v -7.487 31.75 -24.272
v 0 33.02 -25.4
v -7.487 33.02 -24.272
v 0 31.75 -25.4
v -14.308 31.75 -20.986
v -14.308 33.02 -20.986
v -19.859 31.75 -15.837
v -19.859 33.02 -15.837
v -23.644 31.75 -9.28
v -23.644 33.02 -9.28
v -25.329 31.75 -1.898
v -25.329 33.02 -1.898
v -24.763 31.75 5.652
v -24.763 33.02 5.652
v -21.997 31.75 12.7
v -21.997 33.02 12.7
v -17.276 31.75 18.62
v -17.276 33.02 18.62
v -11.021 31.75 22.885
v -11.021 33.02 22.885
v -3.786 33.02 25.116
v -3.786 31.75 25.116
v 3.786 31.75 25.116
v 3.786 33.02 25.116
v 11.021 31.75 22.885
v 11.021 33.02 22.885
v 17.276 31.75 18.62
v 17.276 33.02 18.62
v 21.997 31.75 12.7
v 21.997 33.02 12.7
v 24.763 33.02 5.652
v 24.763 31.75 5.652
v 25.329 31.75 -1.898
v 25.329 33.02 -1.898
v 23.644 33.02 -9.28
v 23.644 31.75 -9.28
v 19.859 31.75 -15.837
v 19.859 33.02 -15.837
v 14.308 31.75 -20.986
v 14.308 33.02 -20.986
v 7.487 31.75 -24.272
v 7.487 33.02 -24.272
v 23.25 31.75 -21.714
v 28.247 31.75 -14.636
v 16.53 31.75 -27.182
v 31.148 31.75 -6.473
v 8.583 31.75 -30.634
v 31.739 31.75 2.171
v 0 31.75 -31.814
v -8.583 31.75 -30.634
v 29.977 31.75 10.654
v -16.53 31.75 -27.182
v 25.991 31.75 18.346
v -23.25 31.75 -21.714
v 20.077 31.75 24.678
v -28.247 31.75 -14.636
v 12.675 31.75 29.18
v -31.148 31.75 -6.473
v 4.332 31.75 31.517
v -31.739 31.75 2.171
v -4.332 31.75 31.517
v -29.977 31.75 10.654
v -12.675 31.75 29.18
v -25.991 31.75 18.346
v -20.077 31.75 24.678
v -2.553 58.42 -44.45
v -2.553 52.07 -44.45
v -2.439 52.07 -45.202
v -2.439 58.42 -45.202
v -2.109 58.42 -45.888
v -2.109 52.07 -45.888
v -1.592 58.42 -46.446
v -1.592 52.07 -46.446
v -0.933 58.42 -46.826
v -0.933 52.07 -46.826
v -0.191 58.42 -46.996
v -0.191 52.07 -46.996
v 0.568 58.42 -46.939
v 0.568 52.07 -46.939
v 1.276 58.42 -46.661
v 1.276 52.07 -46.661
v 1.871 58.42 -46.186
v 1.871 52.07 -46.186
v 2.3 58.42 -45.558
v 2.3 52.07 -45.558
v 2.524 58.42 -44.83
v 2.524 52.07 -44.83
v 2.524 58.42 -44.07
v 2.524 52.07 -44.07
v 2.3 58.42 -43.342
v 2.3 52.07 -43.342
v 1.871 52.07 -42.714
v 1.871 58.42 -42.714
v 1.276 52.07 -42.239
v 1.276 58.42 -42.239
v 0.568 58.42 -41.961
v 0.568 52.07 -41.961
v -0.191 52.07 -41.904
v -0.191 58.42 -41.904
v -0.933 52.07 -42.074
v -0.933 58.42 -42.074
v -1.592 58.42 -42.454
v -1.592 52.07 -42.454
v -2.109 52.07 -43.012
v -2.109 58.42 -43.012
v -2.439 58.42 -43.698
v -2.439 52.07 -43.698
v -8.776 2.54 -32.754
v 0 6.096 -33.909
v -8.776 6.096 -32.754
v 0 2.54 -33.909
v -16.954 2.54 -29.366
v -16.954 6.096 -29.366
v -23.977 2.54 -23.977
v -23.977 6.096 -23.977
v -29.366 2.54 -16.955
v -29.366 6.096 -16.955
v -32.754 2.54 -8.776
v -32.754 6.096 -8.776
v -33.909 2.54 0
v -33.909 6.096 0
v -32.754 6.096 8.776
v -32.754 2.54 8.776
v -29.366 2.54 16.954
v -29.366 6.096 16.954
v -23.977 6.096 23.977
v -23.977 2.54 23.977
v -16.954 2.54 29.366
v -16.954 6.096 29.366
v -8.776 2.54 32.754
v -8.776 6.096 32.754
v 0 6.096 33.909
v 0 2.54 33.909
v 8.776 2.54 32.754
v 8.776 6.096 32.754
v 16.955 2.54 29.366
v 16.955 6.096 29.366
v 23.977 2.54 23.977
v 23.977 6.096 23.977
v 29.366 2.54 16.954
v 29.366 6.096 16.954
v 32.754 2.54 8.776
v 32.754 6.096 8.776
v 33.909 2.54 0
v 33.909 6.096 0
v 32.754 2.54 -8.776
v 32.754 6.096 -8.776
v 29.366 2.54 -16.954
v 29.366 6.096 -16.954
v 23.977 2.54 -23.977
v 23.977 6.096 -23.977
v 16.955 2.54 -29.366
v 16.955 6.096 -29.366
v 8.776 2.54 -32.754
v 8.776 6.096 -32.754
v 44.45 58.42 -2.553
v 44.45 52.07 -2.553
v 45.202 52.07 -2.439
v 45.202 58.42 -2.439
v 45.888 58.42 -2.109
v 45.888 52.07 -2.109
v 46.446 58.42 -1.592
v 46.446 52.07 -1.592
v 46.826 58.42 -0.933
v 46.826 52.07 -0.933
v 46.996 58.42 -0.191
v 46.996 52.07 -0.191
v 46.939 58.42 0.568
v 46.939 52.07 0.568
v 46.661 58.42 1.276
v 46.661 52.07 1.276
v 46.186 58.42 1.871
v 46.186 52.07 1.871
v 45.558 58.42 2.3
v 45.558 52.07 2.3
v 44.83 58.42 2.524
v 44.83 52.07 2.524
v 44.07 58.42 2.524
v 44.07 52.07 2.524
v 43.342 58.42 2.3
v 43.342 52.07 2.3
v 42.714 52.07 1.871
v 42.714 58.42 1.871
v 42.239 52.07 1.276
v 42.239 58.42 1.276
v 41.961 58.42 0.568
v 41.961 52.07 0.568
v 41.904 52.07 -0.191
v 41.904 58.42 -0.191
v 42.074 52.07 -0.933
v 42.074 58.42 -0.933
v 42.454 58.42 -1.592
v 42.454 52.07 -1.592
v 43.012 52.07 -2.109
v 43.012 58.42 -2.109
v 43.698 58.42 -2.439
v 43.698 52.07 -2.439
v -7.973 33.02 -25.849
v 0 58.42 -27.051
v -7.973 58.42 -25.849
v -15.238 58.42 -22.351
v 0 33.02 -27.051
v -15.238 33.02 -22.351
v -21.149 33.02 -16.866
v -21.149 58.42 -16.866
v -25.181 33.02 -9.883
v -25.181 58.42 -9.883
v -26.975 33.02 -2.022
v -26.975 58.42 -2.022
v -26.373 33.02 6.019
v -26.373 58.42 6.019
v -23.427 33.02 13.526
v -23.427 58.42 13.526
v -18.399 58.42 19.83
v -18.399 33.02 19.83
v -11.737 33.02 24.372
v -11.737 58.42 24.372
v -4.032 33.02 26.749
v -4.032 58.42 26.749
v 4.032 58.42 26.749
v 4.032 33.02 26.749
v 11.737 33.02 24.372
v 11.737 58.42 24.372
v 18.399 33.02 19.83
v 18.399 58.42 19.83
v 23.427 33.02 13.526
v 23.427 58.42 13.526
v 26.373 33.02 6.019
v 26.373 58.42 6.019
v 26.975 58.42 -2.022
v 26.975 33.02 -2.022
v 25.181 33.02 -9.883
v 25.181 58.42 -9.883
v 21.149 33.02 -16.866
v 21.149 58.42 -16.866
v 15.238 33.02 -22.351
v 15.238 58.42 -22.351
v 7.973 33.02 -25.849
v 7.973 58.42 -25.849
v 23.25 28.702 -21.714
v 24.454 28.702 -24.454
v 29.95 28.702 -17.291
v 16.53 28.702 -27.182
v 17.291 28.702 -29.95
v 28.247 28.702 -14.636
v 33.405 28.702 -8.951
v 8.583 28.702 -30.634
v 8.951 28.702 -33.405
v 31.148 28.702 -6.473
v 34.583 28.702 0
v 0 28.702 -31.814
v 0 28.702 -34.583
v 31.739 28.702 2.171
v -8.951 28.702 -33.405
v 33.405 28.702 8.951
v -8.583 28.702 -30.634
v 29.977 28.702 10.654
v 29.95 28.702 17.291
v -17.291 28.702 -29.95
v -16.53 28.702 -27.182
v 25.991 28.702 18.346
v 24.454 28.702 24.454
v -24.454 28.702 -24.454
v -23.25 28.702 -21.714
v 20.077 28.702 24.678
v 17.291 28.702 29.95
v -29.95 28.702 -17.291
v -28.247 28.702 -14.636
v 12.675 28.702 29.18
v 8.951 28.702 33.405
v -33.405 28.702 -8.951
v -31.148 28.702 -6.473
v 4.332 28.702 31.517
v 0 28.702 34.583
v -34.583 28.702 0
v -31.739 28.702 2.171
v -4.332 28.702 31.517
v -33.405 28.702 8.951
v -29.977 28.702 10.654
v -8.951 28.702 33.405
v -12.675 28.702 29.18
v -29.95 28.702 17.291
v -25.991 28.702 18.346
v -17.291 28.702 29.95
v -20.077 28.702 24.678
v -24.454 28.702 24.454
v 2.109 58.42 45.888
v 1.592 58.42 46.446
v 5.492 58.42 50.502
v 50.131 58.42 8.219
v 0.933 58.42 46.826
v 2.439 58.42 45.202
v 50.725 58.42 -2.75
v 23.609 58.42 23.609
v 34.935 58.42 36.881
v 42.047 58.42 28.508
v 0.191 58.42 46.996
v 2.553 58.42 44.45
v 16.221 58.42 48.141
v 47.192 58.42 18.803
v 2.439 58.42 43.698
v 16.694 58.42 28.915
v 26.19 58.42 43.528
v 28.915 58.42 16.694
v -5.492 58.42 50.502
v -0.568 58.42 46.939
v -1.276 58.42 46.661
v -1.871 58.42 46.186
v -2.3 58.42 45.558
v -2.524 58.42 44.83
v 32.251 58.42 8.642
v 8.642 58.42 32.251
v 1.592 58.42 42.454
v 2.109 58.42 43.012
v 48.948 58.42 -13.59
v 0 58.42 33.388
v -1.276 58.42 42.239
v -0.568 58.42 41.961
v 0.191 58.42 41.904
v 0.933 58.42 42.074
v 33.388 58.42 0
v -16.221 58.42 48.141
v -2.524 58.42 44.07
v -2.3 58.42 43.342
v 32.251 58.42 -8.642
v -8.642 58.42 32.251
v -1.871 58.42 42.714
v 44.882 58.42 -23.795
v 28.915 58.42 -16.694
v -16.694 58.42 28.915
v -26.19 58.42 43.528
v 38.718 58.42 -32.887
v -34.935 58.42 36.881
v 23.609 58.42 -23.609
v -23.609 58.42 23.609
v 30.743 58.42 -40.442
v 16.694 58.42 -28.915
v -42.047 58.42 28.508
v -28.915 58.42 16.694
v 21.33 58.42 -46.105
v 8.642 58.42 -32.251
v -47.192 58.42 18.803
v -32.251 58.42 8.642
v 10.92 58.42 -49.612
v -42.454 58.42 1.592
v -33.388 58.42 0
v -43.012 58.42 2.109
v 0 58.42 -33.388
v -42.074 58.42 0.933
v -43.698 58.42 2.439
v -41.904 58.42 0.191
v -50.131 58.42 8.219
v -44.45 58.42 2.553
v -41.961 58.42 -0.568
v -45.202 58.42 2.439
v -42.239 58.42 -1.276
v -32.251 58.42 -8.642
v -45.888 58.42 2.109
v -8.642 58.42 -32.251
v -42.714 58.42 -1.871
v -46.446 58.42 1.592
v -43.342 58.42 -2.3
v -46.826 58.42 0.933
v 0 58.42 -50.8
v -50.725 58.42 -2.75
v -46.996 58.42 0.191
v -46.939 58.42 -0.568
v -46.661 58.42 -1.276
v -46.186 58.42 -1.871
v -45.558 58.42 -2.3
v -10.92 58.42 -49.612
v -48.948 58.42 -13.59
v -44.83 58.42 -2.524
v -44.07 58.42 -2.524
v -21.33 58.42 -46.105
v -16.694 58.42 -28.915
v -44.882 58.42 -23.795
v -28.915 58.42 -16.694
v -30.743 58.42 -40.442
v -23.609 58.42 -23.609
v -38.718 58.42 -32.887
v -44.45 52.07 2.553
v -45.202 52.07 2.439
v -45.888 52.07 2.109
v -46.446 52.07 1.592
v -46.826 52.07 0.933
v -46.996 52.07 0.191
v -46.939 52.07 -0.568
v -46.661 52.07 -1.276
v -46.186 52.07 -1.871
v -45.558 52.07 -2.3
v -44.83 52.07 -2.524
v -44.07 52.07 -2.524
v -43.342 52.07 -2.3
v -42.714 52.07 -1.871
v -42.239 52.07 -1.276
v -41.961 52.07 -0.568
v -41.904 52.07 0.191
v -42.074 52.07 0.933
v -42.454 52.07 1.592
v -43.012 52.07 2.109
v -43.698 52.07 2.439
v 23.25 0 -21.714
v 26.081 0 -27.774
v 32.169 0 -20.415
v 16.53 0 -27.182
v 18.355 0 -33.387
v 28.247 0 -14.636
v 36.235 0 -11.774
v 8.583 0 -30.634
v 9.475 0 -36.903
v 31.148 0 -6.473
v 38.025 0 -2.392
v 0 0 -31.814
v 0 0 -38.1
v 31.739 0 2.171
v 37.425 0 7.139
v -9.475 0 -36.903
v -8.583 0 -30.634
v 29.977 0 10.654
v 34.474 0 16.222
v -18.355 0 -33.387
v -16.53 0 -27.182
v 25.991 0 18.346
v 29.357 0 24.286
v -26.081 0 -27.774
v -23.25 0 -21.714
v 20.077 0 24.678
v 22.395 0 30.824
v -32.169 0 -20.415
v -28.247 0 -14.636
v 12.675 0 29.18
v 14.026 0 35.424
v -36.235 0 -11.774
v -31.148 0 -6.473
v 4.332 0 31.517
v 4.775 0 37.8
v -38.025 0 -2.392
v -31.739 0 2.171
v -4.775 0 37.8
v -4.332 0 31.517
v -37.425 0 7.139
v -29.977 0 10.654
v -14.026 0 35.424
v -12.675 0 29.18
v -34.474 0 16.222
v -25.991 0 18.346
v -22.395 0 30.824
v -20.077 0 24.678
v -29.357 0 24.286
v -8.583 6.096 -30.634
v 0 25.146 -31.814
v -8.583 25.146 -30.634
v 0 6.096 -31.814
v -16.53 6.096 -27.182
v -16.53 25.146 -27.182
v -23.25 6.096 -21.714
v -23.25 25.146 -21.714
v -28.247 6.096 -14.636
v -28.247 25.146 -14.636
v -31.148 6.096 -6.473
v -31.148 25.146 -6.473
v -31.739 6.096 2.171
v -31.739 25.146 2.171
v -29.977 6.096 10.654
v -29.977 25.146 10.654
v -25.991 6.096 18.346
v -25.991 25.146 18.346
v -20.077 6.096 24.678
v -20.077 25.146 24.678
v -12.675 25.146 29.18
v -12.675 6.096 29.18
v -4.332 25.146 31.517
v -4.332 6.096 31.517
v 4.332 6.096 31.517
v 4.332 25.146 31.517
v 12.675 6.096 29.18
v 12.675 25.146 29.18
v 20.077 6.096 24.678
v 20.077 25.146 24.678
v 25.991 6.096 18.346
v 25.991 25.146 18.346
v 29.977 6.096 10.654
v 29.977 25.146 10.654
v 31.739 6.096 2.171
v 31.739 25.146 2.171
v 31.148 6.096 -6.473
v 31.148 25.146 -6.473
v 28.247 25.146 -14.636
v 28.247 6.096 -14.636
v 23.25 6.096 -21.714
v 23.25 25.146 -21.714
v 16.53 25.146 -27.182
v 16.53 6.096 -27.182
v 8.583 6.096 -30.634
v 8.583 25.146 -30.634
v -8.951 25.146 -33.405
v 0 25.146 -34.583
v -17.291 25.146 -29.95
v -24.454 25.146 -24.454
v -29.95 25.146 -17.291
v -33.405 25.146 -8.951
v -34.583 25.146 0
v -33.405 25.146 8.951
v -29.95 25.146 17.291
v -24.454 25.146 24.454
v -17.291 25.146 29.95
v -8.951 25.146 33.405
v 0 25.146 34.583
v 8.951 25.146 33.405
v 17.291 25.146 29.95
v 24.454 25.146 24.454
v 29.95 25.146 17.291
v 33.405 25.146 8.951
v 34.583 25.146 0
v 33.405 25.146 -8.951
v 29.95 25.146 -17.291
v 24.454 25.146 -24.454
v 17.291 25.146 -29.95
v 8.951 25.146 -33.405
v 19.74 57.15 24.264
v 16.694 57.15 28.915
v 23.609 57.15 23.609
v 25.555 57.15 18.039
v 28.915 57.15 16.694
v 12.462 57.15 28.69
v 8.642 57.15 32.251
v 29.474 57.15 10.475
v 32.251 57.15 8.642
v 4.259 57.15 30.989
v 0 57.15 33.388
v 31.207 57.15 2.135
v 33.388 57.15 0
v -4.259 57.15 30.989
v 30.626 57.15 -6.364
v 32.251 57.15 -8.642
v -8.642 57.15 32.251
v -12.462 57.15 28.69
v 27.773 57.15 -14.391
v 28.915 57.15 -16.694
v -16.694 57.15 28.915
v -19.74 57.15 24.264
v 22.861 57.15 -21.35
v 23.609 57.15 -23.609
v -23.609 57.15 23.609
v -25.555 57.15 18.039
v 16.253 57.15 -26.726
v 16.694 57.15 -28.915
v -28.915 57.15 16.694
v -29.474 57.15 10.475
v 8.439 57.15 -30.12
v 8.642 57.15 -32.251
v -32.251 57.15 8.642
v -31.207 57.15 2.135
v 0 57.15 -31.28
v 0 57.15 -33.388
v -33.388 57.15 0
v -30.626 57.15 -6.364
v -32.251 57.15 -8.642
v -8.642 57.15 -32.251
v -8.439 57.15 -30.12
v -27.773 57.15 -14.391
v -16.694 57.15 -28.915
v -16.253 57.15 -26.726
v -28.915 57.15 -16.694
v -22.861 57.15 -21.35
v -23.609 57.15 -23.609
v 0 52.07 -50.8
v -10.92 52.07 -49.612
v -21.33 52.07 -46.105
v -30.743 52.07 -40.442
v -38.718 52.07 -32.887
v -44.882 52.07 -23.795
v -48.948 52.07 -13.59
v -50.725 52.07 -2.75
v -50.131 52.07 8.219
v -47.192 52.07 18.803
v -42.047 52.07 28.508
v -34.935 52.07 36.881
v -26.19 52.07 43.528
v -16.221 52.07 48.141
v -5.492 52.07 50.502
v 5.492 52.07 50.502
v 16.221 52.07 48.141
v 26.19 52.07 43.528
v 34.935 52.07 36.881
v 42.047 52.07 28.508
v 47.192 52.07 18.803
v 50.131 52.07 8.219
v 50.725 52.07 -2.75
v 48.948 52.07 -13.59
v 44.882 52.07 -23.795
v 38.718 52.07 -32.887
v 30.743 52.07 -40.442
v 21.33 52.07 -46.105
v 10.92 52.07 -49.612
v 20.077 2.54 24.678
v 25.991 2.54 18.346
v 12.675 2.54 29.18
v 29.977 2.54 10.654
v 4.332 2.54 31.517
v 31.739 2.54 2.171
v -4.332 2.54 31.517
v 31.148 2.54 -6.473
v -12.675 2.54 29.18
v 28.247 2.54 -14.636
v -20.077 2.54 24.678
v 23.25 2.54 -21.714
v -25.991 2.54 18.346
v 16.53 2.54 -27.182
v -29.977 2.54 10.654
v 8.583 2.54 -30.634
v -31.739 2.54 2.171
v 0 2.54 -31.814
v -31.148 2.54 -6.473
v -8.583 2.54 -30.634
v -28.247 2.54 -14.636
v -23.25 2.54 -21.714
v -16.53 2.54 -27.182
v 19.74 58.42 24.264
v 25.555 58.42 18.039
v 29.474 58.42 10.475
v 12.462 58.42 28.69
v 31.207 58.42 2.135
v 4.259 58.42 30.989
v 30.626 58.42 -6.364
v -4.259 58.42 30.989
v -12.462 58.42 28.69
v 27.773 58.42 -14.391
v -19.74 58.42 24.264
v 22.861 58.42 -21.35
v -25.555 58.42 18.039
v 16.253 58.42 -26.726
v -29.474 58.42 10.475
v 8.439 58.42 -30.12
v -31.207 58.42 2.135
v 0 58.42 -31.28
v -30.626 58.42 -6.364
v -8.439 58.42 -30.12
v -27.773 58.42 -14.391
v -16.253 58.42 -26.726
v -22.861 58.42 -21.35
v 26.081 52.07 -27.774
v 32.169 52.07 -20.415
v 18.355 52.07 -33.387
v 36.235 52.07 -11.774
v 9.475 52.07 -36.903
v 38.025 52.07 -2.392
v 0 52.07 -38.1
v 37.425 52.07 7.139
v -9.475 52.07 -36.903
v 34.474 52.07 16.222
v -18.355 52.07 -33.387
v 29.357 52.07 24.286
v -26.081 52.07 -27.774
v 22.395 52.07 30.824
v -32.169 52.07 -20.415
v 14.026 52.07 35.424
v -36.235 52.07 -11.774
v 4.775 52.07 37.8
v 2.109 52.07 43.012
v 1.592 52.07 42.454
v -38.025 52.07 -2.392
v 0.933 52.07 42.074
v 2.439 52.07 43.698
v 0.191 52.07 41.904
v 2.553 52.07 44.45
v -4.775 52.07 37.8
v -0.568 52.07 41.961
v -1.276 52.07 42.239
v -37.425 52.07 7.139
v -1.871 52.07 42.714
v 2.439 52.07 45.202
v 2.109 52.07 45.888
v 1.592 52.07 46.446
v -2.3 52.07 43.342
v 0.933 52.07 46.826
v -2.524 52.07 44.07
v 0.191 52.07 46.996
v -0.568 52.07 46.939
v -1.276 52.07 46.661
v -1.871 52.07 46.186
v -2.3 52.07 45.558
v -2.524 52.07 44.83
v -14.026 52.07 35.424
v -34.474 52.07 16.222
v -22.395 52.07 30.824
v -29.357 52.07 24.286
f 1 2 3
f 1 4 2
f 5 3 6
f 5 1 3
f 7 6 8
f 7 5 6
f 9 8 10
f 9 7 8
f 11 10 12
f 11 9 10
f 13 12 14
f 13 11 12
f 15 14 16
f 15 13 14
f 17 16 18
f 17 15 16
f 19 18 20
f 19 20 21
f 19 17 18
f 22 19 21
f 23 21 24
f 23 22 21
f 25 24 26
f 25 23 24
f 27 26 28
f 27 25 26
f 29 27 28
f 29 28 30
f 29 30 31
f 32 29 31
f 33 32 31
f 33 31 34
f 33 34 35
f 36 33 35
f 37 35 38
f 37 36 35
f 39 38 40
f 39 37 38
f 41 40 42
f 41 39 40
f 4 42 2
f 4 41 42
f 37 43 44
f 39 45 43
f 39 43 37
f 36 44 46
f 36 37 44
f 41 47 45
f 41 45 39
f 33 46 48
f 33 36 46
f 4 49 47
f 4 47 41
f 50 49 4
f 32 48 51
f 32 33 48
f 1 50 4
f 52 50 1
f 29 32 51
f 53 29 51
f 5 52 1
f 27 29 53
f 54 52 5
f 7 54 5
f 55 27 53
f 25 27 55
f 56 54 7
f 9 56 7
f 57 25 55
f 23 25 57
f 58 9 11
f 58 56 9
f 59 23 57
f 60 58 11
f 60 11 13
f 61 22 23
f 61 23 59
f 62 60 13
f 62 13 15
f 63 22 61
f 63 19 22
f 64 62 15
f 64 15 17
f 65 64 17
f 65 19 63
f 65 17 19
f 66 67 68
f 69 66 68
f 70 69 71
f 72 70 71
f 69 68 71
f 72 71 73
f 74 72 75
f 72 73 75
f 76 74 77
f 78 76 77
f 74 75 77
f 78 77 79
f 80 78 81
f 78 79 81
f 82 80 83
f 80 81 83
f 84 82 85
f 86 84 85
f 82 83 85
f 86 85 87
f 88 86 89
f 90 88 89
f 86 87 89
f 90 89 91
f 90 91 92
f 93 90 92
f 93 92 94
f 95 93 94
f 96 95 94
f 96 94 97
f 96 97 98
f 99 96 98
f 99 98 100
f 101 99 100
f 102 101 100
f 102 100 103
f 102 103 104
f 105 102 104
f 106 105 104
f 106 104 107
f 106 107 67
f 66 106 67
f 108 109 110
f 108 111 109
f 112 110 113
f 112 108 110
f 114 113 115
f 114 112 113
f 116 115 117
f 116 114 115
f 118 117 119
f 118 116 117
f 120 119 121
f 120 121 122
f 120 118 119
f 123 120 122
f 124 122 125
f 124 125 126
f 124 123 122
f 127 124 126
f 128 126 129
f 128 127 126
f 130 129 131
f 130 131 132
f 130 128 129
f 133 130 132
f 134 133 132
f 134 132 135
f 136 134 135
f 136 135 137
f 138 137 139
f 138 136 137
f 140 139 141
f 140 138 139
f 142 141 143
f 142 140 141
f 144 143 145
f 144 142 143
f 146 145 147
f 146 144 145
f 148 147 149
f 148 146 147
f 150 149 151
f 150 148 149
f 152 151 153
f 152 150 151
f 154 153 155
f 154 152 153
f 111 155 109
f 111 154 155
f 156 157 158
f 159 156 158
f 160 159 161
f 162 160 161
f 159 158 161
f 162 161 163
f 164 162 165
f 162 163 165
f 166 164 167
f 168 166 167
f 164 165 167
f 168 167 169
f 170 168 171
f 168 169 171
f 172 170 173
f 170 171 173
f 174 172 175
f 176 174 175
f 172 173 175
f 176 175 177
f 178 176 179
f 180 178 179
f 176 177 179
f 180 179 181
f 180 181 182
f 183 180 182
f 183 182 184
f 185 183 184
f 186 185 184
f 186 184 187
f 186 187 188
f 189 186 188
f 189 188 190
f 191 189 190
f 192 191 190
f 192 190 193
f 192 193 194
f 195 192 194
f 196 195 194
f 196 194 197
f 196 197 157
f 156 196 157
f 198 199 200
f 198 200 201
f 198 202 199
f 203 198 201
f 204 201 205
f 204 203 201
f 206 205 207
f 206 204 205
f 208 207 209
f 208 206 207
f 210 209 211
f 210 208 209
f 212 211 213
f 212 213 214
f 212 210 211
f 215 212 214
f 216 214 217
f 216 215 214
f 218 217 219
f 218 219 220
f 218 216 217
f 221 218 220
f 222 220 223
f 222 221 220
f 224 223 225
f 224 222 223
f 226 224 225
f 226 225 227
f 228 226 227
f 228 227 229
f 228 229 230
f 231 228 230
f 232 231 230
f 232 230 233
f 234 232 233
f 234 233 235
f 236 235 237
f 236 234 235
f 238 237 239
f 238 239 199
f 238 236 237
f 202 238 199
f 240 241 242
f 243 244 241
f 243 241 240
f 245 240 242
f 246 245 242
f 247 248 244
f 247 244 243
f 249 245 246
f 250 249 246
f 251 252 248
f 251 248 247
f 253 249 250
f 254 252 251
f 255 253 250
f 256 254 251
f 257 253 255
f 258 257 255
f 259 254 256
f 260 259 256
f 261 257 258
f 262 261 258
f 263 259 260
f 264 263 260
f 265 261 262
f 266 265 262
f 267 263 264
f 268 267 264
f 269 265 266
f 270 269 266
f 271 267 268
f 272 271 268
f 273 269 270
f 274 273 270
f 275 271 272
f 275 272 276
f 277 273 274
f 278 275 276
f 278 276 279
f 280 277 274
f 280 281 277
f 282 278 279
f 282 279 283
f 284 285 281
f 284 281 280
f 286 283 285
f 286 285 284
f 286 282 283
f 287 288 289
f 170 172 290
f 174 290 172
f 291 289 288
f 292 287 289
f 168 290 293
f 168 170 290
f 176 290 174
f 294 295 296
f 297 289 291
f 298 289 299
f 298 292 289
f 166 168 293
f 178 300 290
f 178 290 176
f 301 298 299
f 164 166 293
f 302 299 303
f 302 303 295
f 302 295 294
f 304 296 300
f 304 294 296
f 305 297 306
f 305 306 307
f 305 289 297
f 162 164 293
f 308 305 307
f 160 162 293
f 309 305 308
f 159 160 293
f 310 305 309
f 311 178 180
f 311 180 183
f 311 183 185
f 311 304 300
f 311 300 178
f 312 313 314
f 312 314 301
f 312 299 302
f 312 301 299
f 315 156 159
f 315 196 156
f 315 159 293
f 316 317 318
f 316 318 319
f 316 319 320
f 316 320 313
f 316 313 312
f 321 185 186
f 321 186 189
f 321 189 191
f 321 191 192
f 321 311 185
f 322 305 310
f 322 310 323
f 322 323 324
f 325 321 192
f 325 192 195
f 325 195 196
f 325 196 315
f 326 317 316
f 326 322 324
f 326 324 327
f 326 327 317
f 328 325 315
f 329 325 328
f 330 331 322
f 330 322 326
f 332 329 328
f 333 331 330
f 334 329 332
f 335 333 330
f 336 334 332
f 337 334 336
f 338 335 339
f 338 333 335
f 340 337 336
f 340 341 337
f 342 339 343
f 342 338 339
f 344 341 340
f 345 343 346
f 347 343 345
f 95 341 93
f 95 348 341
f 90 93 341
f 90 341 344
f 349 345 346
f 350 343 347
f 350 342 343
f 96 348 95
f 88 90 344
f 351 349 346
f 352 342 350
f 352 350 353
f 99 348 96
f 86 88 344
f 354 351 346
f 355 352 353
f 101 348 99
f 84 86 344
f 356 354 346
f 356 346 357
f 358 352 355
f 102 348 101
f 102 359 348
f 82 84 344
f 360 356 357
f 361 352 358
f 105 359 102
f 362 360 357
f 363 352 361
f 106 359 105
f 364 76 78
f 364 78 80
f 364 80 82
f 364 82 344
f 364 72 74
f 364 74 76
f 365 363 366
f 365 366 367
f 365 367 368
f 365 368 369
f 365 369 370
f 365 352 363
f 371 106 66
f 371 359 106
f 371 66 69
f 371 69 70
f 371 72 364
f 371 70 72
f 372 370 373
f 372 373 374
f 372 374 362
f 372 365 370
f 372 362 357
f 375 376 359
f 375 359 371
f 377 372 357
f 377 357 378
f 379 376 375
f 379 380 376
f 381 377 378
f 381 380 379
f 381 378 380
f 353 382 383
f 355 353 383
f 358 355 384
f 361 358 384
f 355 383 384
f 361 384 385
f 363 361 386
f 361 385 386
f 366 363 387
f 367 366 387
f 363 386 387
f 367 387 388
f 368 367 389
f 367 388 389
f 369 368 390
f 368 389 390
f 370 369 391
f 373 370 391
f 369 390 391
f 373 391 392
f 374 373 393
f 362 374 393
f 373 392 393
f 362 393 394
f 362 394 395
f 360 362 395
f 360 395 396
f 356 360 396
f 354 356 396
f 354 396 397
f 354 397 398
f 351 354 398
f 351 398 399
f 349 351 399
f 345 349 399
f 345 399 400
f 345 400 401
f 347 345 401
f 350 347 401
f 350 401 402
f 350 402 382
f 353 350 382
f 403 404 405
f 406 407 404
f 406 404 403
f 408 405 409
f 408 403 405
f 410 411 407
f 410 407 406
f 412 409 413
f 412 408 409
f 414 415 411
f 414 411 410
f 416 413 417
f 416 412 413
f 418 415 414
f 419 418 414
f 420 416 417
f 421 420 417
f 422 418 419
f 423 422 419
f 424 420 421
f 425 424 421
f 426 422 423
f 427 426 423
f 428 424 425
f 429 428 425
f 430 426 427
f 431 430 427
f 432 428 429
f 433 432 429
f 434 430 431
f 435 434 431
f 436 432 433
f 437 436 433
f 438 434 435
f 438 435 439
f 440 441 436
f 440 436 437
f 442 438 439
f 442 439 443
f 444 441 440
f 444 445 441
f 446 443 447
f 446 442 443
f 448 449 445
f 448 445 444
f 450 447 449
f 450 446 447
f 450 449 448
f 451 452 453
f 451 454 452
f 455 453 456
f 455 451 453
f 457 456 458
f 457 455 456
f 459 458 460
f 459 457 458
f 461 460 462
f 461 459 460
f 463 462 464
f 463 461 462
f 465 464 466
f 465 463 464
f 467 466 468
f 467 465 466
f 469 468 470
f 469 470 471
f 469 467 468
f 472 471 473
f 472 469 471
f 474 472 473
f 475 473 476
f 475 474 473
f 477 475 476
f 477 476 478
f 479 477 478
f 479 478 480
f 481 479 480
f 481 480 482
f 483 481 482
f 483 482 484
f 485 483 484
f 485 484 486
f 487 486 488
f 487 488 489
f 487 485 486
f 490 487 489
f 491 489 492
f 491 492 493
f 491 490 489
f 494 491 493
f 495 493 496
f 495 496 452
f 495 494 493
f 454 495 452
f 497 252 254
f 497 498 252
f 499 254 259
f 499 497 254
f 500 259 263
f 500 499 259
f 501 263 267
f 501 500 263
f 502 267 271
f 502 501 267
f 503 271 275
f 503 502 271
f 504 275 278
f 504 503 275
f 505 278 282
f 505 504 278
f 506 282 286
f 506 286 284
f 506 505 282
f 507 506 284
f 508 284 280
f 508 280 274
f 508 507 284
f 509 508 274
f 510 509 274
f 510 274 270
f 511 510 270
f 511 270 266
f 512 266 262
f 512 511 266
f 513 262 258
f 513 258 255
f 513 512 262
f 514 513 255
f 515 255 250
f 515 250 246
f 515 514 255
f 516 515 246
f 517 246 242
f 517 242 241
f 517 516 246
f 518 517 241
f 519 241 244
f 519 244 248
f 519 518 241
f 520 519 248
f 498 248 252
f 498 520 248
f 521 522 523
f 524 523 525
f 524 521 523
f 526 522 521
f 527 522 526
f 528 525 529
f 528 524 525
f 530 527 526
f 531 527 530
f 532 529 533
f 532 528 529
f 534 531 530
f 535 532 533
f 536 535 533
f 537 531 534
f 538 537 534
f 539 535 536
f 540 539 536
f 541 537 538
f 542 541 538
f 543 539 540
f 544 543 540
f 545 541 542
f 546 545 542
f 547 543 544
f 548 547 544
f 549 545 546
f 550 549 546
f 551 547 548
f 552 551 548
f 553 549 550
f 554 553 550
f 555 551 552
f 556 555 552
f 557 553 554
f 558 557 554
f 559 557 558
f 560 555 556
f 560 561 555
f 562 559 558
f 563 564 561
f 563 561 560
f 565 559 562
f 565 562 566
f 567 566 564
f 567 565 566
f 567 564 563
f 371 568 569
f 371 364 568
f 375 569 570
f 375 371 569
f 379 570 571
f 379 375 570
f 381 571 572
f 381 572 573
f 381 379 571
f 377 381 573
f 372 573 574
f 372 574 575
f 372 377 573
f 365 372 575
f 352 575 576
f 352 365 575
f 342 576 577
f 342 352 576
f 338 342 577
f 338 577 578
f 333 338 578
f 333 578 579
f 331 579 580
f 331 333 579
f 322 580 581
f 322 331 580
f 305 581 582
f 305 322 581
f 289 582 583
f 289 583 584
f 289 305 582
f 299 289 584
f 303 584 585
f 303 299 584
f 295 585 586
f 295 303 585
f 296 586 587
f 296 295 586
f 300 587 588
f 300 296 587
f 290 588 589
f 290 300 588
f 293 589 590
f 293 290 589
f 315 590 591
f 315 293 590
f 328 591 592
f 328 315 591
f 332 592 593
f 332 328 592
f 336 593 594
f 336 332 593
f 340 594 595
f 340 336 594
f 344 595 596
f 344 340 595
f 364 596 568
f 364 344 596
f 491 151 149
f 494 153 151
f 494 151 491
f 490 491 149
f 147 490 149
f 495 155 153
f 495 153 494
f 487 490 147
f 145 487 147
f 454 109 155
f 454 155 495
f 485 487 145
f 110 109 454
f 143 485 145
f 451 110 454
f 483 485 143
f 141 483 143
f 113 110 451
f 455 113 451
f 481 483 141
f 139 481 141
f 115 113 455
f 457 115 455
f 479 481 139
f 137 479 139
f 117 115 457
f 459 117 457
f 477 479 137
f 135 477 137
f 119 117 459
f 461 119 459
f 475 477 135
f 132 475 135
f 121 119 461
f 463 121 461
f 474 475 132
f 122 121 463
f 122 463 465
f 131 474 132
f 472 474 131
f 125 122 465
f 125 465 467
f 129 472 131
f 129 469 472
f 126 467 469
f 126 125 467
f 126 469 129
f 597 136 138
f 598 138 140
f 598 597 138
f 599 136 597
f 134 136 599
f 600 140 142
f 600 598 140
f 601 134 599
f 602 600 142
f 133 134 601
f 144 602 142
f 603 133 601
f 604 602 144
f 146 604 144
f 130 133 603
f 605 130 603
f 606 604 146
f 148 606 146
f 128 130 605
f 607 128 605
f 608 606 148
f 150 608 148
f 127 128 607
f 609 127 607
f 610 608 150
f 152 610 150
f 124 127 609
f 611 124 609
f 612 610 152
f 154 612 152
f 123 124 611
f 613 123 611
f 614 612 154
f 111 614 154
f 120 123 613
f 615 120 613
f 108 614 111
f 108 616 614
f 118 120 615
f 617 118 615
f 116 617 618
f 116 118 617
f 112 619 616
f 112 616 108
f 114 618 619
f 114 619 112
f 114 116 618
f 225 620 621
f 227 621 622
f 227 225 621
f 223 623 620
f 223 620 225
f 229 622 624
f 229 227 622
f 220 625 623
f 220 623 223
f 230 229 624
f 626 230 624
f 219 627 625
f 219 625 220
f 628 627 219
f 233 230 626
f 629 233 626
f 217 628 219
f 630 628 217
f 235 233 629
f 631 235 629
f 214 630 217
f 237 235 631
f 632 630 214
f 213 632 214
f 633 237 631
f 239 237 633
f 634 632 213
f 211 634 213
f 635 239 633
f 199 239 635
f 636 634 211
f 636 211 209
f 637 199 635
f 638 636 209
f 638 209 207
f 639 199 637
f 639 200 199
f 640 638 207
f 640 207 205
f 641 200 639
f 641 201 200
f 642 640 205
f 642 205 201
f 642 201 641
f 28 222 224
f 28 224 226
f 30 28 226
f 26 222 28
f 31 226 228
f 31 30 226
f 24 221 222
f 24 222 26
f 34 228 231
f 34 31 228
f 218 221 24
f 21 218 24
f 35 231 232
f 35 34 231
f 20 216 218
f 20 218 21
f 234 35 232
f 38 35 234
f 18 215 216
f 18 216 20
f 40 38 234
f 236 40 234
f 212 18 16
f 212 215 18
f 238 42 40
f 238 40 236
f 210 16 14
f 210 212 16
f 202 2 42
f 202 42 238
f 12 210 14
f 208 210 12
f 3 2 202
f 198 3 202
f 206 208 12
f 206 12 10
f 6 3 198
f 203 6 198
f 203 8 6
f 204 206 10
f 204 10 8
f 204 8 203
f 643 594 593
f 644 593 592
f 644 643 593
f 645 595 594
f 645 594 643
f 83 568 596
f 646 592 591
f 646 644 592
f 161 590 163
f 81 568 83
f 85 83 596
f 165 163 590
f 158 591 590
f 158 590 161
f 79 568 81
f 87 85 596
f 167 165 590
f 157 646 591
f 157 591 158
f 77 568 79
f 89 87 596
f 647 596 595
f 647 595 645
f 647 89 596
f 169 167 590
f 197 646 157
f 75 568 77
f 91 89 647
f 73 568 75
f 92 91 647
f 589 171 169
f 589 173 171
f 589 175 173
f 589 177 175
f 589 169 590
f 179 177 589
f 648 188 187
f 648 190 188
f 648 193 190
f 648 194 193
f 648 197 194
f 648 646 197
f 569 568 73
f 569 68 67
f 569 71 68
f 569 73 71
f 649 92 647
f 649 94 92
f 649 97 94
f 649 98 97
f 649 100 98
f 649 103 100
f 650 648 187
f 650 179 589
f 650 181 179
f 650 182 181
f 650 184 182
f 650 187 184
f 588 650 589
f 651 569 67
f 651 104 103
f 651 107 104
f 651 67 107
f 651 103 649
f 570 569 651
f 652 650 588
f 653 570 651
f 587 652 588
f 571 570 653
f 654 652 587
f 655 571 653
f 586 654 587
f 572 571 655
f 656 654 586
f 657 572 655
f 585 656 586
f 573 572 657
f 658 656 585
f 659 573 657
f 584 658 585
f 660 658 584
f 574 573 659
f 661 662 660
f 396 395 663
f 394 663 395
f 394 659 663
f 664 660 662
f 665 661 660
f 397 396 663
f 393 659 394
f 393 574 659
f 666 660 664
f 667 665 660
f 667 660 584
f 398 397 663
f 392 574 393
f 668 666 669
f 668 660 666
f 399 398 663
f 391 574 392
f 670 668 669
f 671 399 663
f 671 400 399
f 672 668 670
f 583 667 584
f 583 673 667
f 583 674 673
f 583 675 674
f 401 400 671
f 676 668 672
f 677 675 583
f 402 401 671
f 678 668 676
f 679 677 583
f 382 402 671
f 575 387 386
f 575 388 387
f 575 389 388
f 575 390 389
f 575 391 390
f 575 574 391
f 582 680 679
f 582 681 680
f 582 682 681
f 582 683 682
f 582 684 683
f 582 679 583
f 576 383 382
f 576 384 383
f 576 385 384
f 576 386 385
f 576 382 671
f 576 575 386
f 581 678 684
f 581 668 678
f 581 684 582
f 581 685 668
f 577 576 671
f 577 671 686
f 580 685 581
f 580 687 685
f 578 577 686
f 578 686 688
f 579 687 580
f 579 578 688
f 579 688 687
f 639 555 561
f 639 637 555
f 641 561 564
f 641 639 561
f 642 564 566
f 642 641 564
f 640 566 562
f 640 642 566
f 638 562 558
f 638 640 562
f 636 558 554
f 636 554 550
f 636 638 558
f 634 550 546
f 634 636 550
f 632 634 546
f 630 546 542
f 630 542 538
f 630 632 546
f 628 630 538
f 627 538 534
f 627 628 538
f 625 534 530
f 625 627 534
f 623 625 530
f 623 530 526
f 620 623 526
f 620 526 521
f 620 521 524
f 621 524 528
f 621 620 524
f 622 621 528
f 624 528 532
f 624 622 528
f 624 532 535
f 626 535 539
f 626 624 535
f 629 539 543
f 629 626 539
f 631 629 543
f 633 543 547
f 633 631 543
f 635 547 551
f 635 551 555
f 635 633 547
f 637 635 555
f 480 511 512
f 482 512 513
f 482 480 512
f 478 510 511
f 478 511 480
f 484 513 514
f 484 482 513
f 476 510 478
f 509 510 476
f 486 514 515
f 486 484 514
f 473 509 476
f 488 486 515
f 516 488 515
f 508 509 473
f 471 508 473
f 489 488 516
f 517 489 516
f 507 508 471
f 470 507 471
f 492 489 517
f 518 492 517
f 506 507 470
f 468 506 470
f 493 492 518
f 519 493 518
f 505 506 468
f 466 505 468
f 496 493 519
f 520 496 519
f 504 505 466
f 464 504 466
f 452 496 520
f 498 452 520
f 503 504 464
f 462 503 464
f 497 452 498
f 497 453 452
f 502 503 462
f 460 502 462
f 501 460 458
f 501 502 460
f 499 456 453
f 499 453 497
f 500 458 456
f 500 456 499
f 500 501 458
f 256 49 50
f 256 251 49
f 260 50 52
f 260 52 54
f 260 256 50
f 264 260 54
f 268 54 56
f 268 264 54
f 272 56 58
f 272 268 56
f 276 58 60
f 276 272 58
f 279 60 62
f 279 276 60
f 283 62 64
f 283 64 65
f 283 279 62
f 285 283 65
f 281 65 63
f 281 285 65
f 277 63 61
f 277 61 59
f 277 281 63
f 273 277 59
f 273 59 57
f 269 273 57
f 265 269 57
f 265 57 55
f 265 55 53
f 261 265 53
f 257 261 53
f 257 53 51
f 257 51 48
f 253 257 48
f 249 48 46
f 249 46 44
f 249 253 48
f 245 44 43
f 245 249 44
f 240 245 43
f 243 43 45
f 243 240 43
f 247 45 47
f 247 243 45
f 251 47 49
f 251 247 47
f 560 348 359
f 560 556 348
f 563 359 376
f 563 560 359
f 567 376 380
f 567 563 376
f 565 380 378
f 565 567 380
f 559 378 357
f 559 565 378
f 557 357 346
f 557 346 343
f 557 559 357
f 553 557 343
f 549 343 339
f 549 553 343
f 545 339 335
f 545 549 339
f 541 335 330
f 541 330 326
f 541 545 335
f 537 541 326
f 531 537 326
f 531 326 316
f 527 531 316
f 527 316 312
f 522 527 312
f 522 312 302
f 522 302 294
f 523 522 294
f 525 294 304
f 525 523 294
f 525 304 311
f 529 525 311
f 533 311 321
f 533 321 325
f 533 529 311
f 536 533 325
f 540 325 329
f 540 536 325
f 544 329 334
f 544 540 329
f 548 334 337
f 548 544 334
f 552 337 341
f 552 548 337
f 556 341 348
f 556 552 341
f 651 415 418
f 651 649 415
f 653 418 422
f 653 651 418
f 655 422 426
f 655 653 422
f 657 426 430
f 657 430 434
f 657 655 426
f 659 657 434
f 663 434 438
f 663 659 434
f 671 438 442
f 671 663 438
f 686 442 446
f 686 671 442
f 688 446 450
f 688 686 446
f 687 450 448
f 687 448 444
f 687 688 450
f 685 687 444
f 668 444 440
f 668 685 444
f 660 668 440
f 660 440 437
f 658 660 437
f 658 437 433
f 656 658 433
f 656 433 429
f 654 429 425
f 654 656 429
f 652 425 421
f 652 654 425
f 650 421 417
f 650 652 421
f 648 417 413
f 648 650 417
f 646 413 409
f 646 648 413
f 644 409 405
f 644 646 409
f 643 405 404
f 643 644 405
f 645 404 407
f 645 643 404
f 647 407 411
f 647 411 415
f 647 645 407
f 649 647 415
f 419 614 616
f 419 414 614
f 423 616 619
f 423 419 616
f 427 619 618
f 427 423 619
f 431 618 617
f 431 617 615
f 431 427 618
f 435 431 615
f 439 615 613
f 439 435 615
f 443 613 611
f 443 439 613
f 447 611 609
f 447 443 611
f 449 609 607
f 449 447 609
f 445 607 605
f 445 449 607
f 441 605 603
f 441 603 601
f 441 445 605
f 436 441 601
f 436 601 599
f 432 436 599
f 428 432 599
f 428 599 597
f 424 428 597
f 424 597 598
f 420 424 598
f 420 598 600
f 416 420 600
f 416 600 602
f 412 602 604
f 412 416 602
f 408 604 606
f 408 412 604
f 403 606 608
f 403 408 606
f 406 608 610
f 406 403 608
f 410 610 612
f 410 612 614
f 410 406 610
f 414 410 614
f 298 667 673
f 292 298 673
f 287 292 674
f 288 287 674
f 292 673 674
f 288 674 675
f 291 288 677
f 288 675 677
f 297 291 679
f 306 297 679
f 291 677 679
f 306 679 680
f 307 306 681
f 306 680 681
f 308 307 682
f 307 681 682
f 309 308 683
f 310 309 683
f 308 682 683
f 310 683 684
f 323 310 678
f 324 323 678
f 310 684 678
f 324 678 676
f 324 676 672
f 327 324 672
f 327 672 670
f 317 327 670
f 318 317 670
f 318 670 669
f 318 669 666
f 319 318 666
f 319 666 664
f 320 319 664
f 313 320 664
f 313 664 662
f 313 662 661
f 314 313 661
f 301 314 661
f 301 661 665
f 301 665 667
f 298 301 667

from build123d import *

# Parameters (mm, degrees)
TAPPED_HOLE_FOR_10_32_HELICOIL1_D = 5.1054
CIRPATTERN1_COUNT                 = 4


with BuildPart() as part:
    # Sketch1 → Revolve1 (revolve)
    with BuildSketch(Plane.XY, mode=Mode.PRIVATE) as revolve1_sk:
        Polygon((31.8135, 0), (38.1, 0), (38.1, 52.07), (50.8, 52.07), (50.8, 58.42), (33.3883, 58.42), (33.3883, 57.15), (31.2801, 57.15), (31.2801, 58.42), (27.051, 58.42), (27.051, 33.02), (25.4, 33.02), (25.4, 31.75), (31.8135, 31.75), (31.8135, 28.702), (34.582975987, 28.702), (34.582975987, 25.146), (31.8135, 25.146), (31.8135, 6.096), (33.909, 6.096), (33.909, 2.54), (31.8135, 2.54), align=None)
    revolve(revolve1_sk.sketch.rotate(Axis((0, 0, 0), (0, 1, 0)), 90), axis=Axis((0, 0, 0), (0, 1, 0)))

    # Tapped Hole for #10-32 Helicoil1 (through all)
    with Locations(Plane(origin=(0, 58.42, 0), x_dir=(1, 0, 0), z_dir=(0, 1, 0))):
        with Locations((0, 44.45)):
            tapped_hole_for_10_32_helicoil1 = Hole(TAPPED_HOLE_FOR_10_32_HELICOIL1_D / 2)

    # CirPattern1: Tapped Hole for #10-32 Helicoil1 ×4 about axis
    cirpattern1_axis = Axis((0, 0, 0), (0, 1, 0))
    for i in range(1, CIRPATTERN1_COUNT):
        add(tapped_hole_for_10_32_helicoil1.rotate(cirpattern1_axis, i * 360 / CIRPATTERN1_COUNT), mode=Mode.SUBTRACT)


solid = part.part
